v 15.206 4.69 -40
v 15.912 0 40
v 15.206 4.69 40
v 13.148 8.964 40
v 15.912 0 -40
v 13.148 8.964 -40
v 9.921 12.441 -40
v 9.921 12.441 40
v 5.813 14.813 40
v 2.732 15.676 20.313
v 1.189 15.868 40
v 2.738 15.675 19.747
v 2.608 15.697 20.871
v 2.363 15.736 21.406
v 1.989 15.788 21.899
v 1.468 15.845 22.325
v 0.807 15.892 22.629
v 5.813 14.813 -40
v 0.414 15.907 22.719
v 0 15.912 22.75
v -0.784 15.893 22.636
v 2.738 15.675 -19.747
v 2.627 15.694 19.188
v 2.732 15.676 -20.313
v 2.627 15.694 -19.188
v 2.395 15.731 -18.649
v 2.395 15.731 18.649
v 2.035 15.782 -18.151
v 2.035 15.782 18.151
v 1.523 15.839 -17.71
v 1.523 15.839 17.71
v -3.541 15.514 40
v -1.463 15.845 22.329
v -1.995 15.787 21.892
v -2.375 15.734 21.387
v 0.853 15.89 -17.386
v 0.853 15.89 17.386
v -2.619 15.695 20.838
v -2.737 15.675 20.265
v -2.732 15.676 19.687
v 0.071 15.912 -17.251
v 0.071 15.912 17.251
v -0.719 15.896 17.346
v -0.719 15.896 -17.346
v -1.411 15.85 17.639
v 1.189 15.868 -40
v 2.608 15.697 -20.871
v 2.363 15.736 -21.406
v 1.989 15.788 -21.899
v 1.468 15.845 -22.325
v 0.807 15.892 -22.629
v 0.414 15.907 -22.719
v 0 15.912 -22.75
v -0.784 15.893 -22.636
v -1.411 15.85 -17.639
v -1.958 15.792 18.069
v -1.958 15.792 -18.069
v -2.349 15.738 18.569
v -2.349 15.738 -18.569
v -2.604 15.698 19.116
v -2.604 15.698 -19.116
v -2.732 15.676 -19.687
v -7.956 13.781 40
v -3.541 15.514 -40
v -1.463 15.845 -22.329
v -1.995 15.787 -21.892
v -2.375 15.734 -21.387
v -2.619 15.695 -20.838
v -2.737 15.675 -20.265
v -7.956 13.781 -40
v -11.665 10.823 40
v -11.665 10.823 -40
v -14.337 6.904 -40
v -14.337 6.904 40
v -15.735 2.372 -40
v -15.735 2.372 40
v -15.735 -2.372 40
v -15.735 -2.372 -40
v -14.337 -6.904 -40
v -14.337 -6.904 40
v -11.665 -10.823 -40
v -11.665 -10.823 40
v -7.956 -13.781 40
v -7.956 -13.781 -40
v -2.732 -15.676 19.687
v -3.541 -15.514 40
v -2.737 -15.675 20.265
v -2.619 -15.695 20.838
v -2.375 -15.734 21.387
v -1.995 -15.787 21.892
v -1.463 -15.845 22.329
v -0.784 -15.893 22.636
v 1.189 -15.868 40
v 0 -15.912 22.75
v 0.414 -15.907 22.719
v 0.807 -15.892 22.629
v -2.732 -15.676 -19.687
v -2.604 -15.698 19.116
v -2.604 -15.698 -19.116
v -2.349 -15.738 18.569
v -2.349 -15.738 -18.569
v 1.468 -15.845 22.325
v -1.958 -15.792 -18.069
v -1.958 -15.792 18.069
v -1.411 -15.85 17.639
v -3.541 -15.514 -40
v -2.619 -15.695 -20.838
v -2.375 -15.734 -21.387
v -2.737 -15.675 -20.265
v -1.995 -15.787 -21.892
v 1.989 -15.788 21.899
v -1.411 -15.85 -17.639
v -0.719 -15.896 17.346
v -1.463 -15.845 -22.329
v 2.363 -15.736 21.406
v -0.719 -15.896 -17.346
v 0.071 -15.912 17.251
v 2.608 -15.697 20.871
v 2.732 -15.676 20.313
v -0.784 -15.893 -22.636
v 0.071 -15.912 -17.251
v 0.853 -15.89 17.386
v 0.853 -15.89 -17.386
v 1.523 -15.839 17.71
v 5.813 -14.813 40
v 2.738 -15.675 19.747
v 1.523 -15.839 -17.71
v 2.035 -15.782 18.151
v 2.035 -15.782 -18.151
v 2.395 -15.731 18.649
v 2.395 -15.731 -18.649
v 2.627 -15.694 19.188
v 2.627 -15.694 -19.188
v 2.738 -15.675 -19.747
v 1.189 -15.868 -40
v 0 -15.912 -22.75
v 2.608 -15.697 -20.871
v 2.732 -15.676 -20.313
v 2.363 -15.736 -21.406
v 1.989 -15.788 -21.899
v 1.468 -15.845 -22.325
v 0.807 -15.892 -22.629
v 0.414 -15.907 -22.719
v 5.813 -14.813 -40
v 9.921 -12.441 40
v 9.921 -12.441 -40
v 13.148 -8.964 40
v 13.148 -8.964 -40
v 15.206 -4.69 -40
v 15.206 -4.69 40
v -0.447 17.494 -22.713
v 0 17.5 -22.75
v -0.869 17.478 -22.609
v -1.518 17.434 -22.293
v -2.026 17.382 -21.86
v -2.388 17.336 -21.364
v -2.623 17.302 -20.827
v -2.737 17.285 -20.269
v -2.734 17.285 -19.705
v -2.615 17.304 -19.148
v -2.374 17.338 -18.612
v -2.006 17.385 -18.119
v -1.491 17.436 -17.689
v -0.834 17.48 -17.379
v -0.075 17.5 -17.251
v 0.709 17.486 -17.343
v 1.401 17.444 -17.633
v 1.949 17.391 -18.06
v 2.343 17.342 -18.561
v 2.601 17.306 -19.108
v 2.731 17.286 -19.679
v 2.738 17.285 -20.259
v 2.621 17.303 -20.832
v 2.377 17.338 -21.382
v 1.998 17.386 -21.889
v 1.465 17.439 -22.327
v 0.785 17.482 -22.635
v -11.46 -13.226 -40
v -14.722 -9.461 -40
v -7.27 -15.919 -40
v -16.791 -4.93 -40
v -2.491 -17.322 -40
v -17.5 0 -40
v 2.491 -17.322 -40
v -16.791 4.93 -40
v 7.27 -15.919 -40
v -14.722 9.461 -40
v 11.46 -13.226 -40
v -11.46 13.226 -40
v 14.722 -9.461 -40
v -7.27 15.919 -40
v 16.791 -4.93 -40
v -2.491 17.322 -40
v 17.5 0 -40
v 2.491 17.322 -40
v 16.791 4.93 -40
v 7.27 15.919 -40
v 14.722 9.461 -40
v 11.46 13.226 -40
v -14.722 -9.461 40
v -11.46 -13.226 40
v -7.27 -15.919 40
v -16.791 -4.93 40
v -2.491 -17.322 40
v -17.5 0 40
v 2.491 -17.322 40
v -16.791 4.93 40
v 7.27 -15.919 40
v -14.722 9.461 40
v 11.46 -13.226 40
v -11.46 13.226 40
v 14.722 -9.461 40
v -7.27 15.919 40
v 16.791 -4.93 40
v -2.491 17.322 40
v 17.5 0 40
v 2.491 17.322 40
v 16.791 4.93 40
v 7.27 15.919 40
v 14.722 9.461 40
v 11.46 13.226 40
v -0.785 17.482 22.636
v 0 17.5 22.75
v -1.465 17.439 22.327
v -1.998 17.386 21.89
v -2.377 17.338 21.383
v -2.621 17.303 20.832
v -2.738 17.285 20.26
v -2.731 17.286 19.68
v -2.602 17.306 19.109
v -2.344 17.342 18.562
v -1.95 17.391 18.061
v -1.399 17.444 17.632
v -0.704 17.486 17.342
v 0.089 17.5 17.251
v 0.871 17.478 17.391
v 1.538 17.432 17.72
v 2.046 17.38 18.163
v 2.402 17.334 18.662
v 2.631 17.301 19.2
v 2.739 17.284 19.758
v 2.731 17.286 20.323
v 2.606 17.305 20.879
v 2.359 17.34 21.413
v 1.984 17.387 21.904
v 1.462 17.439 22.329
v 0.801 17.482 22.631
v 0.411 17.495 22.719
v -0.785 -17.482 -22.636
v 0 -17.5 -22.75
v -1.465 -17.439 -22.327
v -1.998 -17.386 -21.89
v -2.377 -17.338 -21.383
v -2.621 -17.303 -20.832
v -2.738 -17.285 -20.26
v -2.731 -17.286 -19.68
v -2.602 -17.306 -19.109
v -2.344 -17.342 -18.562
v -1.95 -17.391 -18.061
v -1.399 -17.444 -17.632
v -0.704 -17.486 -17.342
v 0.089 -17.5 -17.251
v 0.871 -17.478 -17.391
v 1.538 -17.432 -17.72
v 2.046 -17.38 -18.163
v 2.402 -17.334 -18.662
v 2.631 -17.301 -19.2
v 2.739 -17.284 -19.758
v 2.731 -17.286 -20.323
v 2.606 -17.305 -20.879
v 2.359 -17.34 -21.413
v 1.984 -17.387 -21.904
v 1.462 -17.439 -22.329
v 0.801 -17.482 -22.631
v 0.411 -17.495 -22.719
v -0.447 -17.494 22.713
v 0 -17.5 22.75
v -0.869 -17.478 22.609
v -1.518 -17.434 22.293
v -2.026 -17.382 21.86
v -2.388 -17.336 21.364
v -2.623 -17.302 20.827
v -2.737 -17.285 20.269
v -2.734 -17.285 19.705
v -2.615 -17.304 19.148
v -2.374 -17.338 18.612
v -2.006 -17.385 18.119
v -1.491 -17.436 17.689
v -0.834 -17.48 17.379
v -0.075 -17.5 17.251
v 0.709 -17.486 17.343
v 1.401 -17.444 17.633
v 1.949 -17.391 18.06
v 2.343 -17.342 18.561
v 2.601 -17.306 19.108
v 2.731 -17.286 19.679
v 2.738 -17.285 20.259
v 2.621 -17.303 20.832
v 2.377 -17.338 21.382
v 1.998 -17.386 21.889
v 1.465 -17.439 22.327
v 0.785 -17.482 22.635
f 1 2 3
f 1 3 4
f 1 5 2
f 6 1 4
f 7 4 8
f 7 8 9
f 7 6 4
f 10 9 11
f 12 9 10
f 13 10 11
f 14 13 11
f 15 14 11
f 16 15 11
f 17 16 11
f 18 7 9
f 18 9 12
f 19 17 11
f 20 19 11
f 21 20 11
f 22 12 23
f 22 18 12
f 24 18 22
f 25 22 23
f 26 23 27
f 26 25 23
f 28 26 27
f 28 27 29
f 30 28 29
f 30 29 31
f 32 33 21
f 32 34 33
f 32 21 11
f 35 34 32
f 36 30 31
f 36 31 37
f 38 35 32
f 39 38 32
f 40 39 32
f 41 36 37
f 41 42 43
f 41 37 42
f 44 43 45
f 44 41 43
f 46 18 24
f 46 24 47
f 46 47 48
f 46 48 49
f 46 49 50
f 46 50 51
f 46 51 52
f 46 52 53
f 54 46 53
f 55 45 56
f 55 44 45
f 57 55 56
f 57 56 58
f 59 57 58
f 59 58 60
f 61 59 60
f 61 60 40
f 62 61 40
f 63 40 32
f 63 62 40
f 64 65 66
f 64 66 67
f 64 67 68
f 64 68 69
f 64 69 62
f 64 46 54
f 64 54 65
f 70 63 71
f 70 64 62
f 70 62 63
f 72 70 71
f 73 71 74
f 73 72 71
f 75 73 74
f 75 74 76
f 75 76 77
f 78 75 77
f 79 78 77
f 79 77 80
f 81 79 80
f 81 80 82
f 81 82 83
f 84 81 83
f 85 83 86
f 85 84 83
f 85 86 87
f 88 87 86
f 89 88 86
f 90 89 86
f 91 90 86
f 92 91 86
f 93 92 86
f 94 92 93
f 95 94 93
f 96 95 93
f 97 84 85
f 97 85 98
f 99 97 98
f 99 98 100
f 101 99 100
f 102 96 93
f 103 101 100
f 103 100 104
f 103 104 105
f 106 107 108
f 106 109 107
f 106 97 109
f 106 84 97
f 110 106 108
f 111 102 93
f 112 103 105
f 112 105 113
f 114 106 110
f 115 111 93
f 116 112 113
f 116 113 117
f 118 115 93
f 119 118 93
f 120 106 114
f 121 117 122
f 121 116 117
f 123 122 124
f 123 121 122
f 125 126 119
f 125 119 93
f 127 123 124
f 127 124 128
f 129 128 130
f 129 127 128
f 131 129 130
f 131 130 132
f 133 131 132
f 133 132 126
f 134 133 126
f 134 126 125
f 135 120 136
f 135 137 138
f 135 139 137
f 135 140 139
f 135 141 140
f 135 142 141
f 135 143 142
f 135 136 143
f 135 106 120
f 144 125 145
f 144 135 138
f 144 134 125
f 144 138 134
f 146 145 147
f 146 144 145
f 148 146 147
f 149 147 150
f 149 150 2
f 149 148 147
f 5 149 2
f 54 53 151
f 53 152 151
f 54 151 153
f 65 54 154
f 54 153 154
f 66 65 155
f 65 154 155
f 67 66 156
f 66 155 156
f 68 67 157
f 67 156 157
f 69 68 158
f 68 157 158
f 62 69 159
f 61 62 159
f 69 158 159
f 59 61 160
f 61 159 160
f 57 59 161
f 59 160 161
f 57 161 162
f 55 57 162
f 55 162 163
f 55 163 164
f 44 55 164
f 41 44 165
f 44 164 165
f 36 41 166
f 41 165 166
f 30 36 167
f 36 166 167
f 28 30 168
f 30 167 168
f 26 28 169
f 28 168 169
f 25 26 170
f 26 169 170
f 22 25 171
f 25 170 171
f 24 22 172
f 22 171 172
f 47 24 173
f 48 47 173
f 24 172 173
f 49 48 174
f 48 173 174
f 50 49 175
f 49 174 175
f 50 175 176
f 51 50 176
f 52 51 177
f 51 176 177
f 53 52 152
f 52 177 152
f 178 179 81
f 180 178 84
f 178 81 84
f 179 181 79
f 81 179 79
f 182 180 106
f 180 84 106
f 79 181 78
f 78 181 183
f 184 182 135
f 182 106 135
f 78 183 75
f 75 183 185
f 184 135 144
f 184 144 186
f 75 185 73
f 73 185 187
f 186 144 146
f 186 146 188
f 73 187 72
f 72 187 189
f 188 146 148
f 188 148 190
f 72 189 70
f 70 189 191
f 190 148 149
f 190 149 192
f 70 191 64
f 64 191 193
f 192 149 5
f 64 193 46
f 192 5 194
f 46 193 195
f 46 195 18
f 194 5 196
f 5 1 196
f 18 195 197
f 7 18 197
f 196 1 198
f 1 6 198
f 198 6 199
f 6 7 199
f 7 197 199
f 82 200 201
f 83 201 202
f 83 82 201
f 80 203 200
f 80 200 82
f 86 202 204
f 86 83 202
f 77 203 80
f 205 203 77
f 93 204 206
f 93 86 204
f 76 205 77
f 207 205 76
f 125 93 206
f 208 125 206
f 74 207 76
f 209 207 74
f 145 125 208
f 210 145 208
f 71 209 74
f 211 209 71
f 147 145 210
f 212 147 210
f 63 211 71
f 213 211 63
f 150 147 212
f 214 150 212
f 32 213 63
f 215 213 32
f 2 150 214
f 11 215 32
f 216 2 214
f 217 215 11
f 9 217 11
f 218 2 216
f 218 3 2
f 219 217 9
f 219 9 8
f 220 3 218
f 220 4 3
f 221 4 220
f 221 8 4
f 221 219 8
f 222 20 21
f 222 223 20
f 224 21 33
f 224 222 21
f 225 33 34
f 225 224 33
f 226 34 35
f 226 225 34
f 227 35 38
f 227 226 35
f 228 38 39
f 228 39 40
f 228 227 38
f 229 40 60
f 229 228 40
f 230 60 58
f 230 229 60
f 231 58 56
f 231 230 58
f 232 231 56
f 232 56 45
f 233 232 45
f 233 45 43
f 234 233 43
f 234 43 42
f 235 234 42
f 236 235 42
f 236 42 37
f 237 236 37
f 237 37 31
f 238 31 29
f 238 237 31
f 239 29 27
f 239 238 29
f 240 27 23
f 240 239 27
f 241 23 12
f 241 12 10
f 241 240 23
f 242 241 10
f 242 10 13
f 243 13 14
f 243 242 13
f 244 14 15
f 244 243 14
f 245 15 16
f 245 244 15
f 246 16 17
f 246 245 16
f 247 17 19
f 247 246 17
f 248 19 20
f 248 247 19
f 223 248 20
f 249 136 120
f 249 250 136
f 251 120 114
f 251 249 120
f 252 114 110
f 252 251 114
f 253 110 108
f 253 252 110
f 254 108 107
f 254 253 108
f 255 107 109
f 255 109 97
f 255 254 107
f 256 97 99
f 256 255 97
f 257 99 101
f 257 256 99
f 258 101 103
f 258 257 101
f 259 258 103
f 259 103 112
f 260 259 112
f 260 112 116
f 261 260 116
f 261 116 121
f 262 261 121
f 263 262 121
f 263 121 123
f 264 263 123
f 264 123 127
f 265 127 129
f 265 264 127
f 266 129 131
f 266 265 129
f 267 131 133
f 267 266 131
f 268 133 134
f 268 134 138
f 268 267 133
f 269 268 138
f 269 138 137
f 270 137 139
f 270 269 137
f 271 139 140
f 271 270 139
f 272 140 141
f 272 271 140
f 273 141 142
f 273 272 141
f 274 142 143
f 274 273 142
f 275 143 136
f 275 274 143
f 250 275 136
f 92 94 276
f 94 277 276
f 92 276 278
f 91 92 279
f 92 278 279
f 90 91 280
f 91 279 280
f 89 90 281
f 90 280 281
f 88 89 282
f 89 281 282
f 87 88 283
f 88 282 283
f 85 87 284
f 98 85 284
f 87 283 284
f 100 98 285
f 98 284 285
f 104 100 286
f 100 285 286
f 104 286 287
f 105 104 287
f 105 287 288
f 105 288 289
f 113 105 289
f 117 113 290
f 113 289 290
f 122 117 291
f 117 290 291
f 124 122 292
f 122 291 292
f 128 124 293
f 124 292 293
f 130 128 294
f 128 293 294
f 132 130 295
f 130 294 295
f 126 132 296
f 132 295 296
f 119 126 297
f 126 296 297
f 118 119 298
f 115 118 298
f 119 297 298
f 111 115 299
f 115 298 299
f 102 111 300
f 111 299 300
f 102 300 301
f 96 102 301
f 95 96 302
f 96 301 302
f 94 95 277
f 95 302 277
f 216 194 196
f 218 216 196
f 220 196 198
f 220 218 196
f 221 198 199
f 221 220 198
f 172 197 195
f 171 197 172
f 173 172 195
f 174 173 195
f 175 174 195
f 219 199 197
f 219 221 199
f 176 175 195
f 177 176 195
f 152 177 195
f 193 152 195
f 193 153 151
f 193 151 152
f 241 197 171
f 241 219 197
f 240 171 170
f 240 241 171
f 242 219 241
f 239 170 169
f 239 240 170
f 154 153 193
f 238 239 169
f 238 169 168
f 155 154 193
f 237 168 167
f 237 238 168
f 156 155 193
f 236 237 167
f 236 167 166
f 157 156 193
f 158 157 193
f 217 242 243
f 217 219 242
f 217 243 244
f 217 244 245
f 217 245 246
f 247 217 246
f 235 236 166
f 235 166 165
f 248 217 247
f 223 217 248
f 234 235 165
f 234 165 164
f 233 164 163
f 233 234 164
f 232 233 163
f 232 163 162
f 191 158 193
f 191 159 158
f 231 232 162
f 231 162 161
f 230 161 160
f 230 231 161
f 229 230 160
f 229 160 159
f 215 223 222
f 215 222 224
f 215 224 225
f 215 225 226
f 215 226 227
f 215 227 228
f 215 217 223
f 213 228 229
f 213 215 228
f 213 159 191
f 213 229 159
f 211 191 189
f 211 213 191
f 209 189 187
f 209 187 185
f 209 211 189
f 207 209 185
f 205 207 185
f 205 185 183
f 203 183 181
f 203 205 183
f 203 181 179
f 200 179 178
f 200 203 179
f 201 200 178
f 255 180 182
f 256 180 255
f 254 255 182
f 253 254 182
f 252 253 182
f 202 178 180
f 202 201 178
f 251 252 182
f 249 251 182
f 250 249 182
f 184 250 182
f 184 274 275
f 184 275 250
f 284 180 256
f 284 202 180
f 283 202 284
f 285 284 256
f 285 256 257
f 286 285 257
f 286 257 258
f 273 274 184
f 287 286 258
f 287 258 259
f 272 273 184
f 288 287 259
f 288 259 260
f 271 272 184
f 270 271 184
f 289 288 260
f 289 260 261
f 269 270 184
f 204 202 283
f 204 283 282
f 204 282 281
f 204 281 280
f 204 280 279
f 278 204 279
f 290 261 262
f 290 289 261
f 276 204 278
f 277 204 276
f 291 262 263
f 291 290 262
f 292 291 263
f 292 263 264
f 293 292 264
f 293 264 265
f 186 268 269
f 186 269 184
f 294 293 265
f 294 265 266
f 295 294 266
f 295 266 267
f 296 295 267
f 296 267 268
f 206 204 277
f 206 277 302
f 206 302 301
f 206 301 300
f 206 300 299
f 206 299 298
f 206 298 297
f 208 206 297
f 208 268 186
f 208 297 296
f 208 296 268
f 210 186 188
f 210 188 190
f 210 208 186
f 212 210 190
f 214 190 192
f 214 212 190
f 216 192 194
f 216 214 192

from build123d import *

# Parameters (mm, degrees)
SKETCH1_R                                  = 17.5
SKETCH1_R_2                                = 15.9125
BOSS_EXTRUDE1_DEPTH                        = 40
SKETCH5_W                                  = 2.75
SKETCH5_H                                  = 17.5
MIRROR1_AT_THE_SECOND_PLANE_COPY_1_SKETC_W = 2.75
MIRROR1_AT_THE_SECOND_PLANE_COPY_1_SKETC_H = 17.5


with BuildPart() as part:
    # Sketch1 → Boss-Extrude1 (new body, symmetric)
    with BuildSketch(Plane.XY):
        Circle(SKETCH1_R)
        Circle(SKETCH1_R_2, mode=Mode.SUBTRACT)
    extrude(amount=BOSS_EXTRUDE1_DEPTH, both=True)

    # Sketch5 → M5 Clearance Hole1 (revolve, cut)
    with BuildSketch(Plane(origin=(0, 0, -20), x_dir=(0, 0, -1), z_dir=(1, 0, 0))):
        with Locations((1.375, 8.75)):
            Rectangle(SKETCH5_W, SKETCH5_H)
    m5_clearance_hole1 = revolve(axis=Axis((0, -6.35, -20), (0, 1, 0)), mode=Mode.SUBTRACT)

    # Mirror1: M5 Clearance Hole1 across plane
    add(m5_clearance_hole1.mirror(Plane.XY), mode=Mode.SUBTRACT)

    # Mirror1 at the second plane: M5 Clearance Hole1 across plane
    add(m5_clearance_hole1.mirror(Plane.ZX), mode=Mode.SUBTRACT)

    # Mirror1 at the second plane copy 1 sketc → Mirror1 at the second plane copy 1 (revolve, cut)
    with BuildSketch(Plane(origin=(0, 0, 20), x_dir=(0, 0, 1), z_dir=(1, 0, 0))):
        with Locations((1.375, 8.75)):
            Rectangle(MIRROR1_AT_THE_SECOND_PLANE_COPY_1_SKETC_W, MIRROR1_AT_THE_SECOND_PLANE_COPY_1_SKETC_H)
    revolve(axis=Axis((0, 6.35, 20), (0, -1, 0)), mode=Mode.SUBTRACT)


solid = part.part
